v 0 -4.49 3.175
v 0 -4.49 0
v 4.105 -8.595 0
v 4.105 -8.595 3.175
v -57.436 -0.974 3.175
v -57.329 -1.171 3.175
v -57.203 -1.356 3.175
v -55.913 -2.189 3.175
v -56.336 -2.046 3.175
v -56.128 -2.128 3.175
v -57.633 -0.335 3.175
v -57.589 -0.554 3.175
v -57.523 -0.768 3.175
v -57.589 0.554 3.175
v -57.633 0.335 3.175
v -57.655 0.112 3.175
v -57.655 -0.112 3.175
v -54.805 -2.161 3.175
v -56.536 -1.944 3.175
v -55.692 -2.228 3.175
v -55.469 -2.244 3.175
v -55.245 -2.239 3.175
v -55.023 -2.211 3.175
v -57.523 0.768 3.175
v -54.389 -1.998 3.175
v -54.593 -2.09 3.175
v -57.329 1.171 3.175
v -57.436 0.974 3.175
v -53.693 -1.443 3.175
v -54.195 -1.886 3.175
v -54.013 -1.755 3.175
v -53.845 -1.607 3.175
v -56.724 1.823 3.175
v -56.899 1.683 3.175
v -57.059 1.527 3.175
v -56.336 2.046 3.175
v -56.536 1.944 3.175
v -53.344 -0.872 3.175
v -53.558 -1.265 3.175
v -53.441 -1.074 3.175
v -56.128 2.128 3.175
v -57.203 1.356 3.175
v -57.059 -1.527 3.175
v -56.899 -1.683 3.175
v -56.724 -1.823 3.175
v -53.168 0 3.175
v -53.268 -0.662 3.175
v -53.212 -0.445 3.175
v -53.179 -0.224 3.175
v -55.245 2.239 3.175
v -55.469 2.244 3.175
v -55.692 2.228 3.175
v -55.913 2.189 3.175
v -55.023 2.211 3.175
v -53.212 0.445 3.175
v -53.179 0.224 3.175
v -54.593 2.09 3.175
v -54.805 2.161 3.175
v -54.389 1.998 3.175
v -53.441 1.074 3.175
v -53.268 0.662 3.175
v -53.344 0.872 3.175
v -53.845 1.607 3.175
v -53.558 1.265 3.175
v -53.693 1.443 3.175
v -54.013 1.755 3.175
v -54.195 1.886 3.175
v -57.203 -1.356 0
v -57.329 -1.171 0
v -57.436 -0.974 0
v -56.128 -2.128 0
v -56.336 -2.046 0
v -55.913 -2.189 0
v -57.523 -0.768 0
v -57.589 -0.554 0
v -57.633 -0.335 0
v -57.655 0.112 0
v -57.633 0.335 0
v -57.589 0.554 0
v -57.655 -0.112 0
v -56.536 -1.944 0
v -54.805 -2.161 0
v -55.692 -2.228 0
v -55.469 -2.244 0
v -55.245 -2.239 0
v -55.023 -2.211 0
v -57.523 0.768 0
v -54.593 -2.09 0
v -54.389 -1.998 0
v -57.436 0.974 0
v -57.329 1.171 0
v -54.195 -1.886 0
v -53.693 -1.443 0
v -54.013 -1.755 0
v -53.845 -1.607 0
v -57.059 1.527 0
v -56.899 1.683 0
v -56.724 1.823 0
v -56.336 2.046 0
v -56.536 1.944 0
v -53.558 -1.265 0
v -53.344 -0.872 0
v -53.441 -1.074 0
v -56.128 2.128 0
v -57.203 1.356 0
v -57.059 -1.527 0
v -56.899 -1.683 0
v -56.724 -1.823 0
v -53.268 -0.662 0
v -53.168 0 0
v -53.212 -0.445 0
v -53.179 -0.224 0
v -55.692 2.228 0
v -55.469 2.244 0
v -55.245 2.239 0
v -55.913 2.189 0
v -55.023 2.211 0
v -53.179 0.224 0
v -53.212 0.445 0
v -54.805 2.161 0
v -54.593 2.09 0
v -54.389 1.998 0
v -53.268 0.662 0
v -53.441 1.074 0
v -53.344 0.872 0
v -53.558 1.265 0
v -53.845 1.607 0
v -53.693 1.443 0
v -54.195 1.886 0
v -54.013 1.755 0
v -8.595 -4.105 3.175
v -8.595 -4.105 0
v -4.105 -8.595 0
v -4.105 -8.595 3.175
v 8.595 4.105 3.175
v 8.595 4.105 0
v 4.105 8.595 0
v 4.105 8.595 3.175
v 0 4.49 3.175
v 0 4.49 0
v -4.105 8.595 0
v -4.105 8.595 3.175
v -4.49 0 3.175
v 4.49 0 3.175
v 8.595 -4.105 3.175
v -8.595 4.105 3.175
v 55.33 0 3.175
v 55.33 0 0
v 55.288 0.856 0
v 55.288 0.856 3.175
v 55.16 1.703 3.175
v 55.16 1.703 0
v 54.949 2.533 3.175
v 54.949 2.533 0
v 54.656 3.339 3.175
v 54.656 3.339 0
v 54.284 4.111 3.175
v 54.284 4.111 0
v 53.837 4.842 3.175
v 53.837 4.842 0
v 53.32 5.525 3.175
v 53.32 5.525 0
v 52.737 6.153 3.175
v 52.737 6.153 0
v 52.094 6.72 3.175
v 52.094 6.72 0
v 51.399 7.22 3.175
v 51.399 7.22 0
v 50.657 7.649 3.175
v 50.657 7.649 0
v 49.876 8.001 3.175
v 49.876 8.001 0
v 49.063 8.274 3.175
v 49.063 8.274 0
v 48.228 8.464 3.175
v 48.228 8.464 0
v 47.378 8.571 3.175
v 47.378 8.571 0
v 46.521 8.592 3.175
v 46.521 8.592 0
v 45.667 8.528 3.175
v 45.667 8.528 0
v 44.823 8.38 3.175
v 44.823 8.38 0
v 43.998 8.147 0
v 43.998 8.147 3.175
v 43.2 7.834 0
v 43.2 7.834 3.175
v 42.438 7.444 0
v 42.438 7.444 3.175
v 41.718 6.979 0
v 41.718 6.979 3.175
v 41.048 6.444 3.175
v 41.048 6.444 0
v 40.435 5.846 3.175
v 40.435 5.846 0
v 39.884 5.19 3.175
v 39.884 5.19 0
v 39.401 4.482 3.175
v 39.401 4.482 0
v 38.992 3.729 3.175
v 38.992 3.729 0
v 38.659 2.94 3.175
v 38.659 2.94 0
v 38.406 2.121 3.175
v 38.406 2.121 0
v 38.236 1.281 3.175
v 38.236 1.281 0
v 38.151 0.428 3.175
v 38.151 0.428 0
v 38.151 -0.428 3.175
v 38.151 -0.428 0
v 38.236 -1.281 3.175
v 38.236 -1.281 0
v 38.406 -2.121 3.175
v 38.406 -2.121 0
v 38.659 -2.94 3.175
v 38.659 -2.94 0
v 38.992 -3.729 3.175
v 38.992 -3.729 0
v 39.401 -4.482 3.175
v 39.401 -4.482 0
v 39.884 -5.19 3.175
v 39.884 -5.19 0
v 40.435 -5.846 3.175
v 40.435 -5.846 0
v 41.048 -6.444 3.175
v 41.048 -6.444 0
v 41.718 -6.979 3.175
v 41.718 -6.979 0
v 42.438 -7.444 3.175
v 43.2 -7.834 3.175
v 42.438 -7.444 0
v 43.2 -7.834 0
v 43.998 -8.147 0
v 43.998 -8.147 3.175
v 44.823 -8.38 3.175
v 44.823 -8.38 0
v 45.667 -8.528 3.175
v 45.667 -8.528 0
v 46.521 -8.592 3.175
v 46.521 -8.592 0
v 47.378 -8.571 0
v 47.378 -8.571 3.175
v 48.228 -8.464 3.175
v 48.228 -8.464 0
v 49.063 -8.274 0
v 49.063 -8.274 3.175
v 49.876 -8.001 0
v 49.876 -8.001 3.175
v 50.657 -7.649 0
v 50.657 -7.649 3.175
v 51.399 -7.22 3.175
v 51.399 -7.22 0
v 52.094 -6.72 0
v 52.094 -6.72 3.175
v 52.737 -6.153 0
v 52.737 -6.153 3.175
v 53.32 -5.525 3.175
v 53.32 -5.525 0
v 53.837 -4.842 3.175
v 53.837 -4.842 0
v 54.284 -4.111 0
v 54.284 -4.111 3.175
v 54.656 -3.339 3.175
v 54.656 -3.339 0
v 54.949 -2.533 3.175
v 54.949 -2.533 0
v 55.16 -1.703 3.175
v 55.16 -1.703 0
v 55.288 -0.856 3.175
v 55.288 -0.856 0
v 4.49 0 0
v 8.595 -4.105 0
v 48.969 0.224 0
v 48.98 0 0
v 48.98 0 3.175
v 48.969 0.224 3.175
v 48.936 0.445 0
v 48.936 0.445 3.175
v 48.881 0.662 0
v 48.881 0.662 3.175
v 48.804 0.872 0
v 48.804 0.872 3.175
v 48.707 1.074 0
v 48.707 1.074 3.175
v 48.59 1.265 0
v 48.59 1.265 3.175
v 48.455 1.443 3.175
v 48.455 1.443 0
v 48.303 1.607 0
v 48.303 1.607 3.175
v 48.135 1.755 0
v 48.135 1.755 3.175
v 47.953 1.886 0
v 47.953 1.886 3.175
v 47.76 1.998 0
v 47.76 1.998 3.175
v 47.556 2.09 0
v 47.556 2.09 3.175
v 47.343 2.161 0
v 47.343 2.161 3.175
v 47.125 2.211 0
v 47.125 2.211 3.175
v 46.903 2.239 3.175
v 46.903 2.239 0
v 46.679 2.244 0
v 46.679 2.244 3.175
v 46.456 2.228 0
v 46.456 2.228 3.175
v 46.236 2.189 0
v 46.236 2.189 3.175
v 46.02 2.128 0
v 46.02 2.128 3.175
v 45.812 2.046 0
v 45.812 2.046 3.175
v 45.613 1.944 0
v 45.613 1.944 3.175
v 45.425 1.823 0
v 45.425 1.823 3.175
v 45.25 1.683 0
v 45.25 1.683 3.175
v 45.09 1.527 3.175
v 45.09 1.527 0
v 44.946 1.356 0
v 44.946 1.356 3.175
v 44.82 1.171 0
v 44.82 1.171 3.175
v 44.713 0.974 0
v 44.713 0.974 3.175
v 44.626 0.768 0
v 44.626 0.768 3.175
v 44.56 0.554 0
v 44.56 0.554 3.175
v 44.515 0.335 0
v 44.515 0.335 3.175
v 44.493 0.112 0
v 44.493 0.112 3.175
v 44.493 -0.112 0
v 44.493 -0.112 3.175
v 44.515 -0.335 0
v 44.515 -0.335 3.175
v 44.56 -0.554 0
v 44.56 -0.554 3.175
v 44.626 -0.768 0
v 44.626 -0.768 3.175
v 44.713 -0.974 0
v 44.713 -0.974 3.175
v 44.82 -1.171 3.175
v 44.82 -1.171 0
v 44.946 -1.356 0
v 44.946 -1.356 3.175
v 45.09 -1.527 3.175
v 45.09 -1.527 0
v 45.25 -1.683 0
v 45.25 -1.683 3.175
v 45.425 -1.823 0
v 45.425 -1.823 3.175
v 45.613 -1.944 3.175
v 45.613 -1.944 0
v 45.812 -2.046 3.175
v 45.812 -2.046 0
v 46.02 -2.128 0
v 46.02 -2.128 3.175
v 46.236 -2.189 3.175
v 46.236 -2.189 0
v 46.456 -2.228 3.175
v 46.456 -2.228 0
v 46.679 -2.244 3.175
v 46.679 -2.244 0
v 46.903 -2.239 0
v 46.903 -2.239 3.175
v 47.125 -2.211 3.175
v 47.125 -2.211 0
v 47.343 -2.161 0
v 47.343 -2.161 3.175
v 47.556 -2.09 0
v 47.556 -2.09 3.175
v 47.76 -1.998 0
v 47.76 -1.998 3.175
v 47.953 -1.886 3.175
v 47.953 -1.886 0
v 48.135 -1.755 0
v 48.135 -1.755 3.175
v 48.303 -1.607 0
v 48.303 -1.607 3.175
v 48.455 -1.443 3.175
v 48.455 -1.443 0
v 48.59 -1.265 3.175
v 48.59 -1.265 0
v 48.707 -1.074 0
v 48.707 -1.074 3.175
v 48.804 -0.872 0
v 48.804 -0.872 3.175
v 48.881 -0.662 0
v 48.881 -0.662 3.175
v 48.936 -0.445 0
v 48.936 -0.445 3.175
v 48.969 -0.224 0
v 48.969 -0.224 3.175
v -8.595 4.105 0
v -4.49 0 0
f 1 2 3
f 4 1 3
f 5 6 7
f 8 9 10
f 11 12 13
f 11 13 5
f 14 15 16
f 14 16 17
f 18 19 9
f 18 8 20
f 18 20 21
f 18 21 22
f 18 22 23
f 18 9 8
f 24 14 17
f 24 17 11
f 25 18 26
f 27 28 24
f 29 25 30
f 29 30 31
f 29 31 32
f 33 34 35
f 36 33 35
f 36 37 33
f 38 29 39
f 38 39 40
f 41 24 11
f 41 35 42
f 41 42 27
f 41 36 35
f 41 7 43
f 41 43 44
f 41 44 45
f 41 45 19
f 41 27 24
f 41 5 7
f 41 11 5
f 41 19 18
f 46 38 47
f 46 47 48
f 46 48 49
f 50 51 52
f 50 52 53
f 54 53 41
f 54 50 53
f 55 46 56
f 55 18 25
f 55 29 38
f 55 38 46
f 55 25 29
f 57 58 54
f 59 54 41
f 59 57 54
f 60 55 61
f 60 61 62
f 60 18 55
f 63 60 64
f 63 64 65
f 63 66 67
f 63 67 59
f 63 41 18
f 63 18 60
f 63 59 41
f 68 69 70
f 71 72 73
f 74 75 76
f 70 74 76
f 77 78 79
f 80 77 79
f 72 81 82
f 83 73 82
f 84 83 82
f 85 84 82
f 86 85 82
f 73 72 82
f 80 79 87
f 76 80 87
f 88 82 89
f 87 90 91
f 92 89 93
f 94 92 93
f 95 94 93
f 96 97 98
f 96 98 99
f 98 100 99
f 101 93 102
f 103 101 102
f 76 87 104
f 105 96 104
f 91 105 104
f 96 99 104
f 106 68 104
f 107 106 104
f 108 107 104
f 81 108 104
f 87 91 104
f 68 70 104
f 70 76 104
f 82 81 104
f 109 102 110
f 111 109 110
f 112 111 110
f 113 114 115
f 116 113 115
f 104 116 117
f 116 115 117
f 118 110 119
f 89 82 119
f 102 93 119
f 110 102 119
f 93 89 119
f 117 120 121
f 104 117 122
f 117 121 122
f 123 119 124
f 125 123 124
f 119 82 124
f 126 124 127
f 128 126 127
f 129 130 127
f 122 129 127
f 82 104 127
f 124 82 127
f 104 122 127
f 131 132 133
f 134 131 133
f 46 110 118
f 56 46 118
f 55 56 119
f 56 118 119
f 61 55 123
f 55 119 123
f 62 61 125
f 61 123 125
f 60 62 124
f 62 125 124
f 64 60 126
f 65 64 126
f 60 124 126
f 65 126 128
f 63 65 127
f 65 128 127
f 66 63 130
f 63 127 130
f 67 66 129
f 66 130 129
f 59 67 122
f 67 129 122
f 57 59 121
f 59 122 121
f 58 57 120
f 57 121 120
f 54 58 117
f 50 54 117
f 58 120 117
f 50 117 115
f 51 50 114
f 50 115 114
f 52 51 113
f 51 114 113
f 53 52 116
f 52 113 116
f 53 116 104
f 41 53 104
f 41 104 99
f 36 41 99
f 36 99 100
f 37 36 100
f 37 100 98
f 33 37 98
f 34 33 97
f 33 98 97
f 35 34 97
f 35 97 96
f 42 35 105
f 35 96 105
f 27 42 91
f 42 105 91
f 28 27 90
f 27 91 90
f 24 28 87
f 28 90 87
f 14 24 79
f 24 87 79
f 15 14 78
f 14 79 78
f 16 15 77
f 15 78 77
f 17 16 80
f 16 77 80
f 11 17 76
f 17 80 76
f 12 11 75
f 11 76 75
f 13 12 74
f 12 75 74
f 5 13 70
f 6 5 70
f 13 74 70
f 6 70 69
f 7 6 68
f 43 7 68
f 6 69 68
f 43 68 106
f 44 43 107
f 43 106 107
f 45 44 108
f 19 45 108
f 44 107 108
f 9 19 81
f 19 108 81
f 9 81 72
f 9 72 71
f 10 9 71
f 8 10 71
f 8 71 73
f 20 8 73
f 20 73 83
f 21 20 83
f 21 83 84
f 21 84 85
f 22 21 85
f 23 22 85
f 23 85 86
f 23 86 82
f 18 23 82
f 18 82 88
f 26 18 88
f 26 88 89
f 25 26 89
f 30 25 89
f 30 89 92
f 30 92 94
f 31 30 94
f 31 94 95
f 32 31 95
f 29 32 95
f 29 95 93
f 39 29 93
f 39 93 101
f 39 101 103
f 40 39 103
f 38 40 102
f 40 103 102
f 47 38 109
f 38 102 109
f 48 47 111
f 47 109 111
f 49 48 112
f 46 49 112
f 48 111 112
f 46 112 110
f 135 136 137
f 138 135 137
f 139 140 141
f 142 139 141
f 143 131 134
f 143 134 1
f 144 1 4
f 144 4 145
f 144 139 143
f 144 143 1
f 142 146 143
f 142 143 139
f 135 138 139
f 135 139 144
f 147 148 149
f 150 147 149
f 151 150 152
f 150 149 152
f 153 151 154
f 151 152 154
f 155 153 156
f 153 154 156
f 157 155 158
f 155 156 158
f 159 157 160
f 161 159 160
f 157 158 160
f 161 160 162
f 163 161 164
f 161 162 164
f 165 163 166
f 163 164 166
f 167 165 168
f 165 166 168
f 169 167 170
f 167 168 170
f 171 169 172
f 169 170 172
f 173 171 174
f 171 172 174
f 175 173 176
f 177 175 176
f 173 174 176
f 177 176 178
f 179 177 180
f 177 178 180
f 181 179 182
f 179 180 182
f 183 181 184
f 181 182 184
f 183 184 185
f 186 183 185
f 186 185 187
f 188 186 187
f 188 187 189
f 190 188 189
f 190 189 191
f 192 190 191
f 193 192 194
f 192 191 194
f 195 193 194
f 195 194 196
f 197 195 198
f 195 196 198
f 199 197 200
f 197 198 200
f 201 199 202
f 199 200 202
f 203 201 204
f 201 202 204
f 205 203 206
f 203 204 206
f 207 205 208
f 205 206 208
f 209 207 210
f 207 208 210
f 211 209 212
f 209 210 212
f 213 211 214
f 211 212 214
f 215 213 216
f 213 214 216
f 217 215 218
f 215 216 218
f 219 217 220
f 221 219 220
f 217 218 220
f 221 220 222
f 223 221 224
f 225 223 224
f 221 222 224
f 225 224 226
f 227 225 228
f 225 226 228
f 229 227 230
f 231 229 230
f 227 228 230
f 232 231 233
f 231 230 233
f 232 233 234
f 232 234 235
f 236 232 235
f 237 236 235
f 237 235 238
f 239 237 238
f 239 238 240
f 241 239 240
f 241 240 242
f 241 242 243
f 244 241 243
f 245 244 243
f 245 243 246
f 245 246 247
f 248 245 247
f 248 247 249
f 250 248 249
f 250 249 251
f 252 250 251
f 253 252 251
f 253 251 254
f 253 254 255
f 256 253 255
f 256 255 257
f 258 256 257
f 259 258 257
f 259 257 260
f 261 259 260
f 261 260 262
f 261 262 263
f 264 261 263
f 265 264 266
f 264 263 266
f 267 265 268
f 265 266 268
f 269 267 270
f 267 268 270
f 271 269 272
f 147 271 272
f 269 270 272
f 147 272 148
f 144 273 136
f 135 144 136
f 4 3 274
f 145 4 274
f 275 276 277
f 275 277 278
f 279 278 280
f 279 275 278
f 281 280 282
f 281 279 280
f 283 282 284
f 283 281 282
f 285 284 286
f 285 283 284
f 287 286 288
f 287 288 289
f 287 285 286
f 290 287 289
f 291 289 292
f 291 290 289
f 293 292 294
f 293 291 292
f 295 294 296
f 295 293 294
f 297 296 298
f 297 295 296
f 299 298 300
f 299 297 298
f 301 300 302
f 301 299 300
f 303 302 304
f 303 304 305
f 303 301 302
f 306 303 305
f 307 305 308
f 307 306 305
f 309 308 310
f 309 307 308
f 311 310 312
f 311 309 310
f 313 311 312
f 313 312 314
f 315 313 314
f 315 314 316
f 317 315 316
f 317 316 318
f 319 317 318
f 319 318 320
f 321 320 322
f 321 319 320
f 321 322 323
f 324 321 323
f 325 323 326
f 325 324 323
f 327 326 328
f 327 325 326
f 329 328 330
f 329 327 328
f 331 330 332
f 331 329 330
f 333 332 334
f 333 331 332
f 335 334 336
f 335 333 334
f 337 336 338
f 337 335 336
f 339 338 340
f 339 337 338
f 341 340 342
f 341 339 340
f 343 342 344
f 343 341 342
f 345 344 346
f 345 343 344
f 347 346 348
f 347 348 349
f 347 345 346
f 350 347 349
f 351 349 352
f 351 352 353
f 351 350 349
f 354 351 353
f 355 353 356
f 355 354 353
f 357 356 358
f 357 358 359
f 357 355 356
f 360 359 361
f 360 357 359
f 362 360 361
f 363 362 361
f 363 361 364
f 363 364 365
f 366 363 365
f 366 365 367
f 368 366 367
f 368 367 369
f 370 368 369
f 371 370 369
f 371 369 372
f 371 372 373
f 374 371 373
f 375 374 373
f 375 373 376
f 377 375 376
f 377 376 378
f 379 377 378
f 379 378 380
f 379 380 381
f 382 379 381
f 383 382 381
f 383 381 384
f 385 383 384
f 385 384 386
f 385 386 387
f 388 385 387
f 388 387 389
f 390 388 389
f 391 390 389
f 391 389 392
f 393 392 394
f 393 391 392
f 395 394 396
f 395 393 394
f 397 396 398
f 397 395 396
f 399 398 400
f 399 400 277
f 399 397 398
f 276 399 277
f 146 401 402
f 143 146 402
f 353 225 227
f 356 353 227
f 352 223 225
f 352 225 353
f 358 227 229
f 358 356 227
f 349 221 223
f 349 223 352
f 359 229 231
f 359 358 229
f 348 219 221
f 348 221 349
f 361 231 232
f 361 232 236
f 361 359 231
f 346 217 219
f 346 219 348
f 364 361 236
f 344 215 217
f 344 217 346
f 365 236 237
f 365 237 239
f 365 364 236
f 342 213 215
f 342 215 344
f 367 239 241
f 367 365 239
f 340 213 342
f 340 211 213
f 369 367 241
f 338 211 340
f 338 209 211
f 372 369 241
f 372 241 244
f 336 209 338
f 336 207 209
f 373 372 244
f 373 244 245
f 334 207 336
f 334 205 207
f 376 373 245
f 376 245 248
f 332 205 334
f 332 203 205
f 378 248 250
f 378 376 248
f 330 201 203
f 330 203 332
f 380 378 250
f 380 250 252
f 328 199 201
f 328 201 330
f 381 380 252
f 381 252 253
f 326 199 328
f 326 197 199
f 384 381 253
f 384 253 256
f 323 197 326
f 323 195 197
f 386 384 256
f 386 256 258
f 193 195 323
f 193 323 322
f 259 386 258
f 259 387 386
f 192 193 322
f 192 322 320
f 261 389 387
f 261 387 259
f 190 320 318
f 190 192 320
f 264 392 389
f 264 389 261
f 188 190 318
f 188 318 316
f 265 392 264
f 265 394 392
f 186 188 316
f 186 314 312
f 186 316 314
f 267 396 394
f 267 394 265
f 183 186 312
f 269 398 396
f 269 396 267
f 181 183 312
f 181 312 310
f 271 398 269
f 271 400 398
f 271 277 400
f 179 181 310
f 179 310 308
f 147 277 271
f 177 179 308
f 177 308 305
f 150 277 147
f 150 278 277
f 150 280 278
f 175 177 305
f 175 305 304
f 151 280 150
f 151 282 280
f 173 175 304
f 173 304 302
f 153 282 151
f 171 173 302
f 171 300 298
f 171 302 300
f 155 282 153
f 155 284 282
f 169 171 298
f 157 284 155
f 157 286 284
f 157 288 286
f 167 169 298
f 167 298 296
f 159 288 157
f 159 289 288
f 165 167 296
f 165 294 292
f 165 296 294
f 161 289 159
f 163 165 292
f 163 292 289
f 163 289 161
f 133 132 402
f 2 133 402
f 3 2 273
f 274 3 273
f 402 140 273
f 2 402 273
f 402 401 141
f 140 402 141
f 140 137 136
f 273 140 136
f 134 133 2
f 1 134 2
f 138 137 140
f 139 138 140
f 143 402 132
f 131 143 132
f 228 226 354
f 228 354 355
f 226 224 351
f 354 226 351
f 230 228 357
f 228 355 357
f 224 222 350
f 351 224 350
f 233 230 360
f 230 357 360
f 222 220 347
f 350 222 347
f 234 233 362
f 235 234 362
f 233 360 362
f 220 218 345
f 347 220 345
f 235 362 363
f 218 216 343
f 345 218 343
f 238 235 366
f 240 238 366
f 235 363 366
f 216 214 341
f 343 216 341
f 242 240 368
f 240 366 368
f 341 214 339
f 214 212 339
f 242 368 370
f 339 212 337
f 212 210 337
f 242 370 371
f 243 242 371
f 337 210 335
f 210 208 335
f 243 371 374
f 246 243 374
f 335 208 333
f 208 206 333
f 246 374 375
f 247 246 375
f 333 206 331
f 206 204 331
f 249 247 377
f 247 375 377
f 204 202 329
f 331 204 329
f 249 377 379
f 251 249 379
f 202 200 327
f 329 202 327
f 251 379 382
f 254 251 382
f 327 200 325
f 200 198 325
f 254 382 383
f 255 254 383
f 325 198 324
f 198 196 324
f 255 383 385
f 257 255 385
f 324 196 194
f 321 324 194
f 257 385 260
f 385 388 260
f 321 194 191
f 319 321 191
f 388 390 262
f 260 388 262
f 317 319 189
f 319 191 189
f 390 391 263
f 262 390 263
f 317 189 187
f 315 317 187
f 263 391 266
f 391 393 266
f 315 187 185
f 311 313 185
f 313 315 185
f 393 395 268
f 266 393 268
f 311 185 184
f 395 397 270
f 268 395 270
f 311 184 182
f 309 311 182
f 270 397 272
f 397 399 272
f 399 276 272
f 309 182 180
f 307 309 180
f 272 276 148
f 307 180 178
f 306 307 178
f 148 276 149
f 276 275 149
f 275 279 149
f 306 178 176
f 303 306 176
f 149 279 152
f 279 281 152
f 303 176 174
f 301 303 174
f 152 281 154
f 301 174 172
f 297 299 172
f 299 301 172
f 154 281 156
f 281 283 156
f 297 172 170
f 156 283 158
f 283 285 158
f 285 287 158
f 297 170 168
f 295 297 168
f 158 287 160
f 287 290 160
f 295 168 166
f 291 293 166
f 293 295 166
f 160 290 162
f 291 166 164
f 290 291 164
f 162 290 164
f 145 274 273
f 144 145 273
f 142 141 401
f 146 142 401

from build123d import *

# Parameters (mm, degrees)
F1_DEPTH = 3.175
F2_R     = 8.595064
F2_R_2   = 2.245064
F3_DEPTH = 3.175
F4_R     = 2.245064
F5_DEPTH = 3.175


with BuildPart() as f1:
    # F0 (on Top) → F1 (new body)
    with BuildSketch(Plane.XY):
        Polygon((4.104936, 8.595064), (0, 4.490128), (-4.104936, 8.595064), (-8.595064, 4.104936), (-4.490128, 0), (-8.595064, -4.104936), (-4.104936, -8.595064), (0, -4.490128), (4.104936, -8.595064), (8.595064, -4.104936), (4.490128, 0), (8.595064, 4.104936), align=None)
    extrude(amount=F1_DEPTH)


with BuildPart() as f3:
    # F2 (on Top) → F3 (new body)
    with BuildSketch(Plane.XY):
        with Locations((46.735421, 0)):
            Circle(F2_R)
        with Locations((46.735421, 0)):
            Circle(F2_R_2, mode=Mode.SUBTRACT)
    extrude(amount=F3_DEPTH)


with BuildPart() as f5:
    # F4 (on Top) → F5 (new body)
    with BuildSketch(Plane.XY):
        with Locations((-55.412982, 0)):
            Circle(F4_R)
    extrude(amount=F5_DEPTH)


solid = Compound([f1.part, f3.part, f5.part])
